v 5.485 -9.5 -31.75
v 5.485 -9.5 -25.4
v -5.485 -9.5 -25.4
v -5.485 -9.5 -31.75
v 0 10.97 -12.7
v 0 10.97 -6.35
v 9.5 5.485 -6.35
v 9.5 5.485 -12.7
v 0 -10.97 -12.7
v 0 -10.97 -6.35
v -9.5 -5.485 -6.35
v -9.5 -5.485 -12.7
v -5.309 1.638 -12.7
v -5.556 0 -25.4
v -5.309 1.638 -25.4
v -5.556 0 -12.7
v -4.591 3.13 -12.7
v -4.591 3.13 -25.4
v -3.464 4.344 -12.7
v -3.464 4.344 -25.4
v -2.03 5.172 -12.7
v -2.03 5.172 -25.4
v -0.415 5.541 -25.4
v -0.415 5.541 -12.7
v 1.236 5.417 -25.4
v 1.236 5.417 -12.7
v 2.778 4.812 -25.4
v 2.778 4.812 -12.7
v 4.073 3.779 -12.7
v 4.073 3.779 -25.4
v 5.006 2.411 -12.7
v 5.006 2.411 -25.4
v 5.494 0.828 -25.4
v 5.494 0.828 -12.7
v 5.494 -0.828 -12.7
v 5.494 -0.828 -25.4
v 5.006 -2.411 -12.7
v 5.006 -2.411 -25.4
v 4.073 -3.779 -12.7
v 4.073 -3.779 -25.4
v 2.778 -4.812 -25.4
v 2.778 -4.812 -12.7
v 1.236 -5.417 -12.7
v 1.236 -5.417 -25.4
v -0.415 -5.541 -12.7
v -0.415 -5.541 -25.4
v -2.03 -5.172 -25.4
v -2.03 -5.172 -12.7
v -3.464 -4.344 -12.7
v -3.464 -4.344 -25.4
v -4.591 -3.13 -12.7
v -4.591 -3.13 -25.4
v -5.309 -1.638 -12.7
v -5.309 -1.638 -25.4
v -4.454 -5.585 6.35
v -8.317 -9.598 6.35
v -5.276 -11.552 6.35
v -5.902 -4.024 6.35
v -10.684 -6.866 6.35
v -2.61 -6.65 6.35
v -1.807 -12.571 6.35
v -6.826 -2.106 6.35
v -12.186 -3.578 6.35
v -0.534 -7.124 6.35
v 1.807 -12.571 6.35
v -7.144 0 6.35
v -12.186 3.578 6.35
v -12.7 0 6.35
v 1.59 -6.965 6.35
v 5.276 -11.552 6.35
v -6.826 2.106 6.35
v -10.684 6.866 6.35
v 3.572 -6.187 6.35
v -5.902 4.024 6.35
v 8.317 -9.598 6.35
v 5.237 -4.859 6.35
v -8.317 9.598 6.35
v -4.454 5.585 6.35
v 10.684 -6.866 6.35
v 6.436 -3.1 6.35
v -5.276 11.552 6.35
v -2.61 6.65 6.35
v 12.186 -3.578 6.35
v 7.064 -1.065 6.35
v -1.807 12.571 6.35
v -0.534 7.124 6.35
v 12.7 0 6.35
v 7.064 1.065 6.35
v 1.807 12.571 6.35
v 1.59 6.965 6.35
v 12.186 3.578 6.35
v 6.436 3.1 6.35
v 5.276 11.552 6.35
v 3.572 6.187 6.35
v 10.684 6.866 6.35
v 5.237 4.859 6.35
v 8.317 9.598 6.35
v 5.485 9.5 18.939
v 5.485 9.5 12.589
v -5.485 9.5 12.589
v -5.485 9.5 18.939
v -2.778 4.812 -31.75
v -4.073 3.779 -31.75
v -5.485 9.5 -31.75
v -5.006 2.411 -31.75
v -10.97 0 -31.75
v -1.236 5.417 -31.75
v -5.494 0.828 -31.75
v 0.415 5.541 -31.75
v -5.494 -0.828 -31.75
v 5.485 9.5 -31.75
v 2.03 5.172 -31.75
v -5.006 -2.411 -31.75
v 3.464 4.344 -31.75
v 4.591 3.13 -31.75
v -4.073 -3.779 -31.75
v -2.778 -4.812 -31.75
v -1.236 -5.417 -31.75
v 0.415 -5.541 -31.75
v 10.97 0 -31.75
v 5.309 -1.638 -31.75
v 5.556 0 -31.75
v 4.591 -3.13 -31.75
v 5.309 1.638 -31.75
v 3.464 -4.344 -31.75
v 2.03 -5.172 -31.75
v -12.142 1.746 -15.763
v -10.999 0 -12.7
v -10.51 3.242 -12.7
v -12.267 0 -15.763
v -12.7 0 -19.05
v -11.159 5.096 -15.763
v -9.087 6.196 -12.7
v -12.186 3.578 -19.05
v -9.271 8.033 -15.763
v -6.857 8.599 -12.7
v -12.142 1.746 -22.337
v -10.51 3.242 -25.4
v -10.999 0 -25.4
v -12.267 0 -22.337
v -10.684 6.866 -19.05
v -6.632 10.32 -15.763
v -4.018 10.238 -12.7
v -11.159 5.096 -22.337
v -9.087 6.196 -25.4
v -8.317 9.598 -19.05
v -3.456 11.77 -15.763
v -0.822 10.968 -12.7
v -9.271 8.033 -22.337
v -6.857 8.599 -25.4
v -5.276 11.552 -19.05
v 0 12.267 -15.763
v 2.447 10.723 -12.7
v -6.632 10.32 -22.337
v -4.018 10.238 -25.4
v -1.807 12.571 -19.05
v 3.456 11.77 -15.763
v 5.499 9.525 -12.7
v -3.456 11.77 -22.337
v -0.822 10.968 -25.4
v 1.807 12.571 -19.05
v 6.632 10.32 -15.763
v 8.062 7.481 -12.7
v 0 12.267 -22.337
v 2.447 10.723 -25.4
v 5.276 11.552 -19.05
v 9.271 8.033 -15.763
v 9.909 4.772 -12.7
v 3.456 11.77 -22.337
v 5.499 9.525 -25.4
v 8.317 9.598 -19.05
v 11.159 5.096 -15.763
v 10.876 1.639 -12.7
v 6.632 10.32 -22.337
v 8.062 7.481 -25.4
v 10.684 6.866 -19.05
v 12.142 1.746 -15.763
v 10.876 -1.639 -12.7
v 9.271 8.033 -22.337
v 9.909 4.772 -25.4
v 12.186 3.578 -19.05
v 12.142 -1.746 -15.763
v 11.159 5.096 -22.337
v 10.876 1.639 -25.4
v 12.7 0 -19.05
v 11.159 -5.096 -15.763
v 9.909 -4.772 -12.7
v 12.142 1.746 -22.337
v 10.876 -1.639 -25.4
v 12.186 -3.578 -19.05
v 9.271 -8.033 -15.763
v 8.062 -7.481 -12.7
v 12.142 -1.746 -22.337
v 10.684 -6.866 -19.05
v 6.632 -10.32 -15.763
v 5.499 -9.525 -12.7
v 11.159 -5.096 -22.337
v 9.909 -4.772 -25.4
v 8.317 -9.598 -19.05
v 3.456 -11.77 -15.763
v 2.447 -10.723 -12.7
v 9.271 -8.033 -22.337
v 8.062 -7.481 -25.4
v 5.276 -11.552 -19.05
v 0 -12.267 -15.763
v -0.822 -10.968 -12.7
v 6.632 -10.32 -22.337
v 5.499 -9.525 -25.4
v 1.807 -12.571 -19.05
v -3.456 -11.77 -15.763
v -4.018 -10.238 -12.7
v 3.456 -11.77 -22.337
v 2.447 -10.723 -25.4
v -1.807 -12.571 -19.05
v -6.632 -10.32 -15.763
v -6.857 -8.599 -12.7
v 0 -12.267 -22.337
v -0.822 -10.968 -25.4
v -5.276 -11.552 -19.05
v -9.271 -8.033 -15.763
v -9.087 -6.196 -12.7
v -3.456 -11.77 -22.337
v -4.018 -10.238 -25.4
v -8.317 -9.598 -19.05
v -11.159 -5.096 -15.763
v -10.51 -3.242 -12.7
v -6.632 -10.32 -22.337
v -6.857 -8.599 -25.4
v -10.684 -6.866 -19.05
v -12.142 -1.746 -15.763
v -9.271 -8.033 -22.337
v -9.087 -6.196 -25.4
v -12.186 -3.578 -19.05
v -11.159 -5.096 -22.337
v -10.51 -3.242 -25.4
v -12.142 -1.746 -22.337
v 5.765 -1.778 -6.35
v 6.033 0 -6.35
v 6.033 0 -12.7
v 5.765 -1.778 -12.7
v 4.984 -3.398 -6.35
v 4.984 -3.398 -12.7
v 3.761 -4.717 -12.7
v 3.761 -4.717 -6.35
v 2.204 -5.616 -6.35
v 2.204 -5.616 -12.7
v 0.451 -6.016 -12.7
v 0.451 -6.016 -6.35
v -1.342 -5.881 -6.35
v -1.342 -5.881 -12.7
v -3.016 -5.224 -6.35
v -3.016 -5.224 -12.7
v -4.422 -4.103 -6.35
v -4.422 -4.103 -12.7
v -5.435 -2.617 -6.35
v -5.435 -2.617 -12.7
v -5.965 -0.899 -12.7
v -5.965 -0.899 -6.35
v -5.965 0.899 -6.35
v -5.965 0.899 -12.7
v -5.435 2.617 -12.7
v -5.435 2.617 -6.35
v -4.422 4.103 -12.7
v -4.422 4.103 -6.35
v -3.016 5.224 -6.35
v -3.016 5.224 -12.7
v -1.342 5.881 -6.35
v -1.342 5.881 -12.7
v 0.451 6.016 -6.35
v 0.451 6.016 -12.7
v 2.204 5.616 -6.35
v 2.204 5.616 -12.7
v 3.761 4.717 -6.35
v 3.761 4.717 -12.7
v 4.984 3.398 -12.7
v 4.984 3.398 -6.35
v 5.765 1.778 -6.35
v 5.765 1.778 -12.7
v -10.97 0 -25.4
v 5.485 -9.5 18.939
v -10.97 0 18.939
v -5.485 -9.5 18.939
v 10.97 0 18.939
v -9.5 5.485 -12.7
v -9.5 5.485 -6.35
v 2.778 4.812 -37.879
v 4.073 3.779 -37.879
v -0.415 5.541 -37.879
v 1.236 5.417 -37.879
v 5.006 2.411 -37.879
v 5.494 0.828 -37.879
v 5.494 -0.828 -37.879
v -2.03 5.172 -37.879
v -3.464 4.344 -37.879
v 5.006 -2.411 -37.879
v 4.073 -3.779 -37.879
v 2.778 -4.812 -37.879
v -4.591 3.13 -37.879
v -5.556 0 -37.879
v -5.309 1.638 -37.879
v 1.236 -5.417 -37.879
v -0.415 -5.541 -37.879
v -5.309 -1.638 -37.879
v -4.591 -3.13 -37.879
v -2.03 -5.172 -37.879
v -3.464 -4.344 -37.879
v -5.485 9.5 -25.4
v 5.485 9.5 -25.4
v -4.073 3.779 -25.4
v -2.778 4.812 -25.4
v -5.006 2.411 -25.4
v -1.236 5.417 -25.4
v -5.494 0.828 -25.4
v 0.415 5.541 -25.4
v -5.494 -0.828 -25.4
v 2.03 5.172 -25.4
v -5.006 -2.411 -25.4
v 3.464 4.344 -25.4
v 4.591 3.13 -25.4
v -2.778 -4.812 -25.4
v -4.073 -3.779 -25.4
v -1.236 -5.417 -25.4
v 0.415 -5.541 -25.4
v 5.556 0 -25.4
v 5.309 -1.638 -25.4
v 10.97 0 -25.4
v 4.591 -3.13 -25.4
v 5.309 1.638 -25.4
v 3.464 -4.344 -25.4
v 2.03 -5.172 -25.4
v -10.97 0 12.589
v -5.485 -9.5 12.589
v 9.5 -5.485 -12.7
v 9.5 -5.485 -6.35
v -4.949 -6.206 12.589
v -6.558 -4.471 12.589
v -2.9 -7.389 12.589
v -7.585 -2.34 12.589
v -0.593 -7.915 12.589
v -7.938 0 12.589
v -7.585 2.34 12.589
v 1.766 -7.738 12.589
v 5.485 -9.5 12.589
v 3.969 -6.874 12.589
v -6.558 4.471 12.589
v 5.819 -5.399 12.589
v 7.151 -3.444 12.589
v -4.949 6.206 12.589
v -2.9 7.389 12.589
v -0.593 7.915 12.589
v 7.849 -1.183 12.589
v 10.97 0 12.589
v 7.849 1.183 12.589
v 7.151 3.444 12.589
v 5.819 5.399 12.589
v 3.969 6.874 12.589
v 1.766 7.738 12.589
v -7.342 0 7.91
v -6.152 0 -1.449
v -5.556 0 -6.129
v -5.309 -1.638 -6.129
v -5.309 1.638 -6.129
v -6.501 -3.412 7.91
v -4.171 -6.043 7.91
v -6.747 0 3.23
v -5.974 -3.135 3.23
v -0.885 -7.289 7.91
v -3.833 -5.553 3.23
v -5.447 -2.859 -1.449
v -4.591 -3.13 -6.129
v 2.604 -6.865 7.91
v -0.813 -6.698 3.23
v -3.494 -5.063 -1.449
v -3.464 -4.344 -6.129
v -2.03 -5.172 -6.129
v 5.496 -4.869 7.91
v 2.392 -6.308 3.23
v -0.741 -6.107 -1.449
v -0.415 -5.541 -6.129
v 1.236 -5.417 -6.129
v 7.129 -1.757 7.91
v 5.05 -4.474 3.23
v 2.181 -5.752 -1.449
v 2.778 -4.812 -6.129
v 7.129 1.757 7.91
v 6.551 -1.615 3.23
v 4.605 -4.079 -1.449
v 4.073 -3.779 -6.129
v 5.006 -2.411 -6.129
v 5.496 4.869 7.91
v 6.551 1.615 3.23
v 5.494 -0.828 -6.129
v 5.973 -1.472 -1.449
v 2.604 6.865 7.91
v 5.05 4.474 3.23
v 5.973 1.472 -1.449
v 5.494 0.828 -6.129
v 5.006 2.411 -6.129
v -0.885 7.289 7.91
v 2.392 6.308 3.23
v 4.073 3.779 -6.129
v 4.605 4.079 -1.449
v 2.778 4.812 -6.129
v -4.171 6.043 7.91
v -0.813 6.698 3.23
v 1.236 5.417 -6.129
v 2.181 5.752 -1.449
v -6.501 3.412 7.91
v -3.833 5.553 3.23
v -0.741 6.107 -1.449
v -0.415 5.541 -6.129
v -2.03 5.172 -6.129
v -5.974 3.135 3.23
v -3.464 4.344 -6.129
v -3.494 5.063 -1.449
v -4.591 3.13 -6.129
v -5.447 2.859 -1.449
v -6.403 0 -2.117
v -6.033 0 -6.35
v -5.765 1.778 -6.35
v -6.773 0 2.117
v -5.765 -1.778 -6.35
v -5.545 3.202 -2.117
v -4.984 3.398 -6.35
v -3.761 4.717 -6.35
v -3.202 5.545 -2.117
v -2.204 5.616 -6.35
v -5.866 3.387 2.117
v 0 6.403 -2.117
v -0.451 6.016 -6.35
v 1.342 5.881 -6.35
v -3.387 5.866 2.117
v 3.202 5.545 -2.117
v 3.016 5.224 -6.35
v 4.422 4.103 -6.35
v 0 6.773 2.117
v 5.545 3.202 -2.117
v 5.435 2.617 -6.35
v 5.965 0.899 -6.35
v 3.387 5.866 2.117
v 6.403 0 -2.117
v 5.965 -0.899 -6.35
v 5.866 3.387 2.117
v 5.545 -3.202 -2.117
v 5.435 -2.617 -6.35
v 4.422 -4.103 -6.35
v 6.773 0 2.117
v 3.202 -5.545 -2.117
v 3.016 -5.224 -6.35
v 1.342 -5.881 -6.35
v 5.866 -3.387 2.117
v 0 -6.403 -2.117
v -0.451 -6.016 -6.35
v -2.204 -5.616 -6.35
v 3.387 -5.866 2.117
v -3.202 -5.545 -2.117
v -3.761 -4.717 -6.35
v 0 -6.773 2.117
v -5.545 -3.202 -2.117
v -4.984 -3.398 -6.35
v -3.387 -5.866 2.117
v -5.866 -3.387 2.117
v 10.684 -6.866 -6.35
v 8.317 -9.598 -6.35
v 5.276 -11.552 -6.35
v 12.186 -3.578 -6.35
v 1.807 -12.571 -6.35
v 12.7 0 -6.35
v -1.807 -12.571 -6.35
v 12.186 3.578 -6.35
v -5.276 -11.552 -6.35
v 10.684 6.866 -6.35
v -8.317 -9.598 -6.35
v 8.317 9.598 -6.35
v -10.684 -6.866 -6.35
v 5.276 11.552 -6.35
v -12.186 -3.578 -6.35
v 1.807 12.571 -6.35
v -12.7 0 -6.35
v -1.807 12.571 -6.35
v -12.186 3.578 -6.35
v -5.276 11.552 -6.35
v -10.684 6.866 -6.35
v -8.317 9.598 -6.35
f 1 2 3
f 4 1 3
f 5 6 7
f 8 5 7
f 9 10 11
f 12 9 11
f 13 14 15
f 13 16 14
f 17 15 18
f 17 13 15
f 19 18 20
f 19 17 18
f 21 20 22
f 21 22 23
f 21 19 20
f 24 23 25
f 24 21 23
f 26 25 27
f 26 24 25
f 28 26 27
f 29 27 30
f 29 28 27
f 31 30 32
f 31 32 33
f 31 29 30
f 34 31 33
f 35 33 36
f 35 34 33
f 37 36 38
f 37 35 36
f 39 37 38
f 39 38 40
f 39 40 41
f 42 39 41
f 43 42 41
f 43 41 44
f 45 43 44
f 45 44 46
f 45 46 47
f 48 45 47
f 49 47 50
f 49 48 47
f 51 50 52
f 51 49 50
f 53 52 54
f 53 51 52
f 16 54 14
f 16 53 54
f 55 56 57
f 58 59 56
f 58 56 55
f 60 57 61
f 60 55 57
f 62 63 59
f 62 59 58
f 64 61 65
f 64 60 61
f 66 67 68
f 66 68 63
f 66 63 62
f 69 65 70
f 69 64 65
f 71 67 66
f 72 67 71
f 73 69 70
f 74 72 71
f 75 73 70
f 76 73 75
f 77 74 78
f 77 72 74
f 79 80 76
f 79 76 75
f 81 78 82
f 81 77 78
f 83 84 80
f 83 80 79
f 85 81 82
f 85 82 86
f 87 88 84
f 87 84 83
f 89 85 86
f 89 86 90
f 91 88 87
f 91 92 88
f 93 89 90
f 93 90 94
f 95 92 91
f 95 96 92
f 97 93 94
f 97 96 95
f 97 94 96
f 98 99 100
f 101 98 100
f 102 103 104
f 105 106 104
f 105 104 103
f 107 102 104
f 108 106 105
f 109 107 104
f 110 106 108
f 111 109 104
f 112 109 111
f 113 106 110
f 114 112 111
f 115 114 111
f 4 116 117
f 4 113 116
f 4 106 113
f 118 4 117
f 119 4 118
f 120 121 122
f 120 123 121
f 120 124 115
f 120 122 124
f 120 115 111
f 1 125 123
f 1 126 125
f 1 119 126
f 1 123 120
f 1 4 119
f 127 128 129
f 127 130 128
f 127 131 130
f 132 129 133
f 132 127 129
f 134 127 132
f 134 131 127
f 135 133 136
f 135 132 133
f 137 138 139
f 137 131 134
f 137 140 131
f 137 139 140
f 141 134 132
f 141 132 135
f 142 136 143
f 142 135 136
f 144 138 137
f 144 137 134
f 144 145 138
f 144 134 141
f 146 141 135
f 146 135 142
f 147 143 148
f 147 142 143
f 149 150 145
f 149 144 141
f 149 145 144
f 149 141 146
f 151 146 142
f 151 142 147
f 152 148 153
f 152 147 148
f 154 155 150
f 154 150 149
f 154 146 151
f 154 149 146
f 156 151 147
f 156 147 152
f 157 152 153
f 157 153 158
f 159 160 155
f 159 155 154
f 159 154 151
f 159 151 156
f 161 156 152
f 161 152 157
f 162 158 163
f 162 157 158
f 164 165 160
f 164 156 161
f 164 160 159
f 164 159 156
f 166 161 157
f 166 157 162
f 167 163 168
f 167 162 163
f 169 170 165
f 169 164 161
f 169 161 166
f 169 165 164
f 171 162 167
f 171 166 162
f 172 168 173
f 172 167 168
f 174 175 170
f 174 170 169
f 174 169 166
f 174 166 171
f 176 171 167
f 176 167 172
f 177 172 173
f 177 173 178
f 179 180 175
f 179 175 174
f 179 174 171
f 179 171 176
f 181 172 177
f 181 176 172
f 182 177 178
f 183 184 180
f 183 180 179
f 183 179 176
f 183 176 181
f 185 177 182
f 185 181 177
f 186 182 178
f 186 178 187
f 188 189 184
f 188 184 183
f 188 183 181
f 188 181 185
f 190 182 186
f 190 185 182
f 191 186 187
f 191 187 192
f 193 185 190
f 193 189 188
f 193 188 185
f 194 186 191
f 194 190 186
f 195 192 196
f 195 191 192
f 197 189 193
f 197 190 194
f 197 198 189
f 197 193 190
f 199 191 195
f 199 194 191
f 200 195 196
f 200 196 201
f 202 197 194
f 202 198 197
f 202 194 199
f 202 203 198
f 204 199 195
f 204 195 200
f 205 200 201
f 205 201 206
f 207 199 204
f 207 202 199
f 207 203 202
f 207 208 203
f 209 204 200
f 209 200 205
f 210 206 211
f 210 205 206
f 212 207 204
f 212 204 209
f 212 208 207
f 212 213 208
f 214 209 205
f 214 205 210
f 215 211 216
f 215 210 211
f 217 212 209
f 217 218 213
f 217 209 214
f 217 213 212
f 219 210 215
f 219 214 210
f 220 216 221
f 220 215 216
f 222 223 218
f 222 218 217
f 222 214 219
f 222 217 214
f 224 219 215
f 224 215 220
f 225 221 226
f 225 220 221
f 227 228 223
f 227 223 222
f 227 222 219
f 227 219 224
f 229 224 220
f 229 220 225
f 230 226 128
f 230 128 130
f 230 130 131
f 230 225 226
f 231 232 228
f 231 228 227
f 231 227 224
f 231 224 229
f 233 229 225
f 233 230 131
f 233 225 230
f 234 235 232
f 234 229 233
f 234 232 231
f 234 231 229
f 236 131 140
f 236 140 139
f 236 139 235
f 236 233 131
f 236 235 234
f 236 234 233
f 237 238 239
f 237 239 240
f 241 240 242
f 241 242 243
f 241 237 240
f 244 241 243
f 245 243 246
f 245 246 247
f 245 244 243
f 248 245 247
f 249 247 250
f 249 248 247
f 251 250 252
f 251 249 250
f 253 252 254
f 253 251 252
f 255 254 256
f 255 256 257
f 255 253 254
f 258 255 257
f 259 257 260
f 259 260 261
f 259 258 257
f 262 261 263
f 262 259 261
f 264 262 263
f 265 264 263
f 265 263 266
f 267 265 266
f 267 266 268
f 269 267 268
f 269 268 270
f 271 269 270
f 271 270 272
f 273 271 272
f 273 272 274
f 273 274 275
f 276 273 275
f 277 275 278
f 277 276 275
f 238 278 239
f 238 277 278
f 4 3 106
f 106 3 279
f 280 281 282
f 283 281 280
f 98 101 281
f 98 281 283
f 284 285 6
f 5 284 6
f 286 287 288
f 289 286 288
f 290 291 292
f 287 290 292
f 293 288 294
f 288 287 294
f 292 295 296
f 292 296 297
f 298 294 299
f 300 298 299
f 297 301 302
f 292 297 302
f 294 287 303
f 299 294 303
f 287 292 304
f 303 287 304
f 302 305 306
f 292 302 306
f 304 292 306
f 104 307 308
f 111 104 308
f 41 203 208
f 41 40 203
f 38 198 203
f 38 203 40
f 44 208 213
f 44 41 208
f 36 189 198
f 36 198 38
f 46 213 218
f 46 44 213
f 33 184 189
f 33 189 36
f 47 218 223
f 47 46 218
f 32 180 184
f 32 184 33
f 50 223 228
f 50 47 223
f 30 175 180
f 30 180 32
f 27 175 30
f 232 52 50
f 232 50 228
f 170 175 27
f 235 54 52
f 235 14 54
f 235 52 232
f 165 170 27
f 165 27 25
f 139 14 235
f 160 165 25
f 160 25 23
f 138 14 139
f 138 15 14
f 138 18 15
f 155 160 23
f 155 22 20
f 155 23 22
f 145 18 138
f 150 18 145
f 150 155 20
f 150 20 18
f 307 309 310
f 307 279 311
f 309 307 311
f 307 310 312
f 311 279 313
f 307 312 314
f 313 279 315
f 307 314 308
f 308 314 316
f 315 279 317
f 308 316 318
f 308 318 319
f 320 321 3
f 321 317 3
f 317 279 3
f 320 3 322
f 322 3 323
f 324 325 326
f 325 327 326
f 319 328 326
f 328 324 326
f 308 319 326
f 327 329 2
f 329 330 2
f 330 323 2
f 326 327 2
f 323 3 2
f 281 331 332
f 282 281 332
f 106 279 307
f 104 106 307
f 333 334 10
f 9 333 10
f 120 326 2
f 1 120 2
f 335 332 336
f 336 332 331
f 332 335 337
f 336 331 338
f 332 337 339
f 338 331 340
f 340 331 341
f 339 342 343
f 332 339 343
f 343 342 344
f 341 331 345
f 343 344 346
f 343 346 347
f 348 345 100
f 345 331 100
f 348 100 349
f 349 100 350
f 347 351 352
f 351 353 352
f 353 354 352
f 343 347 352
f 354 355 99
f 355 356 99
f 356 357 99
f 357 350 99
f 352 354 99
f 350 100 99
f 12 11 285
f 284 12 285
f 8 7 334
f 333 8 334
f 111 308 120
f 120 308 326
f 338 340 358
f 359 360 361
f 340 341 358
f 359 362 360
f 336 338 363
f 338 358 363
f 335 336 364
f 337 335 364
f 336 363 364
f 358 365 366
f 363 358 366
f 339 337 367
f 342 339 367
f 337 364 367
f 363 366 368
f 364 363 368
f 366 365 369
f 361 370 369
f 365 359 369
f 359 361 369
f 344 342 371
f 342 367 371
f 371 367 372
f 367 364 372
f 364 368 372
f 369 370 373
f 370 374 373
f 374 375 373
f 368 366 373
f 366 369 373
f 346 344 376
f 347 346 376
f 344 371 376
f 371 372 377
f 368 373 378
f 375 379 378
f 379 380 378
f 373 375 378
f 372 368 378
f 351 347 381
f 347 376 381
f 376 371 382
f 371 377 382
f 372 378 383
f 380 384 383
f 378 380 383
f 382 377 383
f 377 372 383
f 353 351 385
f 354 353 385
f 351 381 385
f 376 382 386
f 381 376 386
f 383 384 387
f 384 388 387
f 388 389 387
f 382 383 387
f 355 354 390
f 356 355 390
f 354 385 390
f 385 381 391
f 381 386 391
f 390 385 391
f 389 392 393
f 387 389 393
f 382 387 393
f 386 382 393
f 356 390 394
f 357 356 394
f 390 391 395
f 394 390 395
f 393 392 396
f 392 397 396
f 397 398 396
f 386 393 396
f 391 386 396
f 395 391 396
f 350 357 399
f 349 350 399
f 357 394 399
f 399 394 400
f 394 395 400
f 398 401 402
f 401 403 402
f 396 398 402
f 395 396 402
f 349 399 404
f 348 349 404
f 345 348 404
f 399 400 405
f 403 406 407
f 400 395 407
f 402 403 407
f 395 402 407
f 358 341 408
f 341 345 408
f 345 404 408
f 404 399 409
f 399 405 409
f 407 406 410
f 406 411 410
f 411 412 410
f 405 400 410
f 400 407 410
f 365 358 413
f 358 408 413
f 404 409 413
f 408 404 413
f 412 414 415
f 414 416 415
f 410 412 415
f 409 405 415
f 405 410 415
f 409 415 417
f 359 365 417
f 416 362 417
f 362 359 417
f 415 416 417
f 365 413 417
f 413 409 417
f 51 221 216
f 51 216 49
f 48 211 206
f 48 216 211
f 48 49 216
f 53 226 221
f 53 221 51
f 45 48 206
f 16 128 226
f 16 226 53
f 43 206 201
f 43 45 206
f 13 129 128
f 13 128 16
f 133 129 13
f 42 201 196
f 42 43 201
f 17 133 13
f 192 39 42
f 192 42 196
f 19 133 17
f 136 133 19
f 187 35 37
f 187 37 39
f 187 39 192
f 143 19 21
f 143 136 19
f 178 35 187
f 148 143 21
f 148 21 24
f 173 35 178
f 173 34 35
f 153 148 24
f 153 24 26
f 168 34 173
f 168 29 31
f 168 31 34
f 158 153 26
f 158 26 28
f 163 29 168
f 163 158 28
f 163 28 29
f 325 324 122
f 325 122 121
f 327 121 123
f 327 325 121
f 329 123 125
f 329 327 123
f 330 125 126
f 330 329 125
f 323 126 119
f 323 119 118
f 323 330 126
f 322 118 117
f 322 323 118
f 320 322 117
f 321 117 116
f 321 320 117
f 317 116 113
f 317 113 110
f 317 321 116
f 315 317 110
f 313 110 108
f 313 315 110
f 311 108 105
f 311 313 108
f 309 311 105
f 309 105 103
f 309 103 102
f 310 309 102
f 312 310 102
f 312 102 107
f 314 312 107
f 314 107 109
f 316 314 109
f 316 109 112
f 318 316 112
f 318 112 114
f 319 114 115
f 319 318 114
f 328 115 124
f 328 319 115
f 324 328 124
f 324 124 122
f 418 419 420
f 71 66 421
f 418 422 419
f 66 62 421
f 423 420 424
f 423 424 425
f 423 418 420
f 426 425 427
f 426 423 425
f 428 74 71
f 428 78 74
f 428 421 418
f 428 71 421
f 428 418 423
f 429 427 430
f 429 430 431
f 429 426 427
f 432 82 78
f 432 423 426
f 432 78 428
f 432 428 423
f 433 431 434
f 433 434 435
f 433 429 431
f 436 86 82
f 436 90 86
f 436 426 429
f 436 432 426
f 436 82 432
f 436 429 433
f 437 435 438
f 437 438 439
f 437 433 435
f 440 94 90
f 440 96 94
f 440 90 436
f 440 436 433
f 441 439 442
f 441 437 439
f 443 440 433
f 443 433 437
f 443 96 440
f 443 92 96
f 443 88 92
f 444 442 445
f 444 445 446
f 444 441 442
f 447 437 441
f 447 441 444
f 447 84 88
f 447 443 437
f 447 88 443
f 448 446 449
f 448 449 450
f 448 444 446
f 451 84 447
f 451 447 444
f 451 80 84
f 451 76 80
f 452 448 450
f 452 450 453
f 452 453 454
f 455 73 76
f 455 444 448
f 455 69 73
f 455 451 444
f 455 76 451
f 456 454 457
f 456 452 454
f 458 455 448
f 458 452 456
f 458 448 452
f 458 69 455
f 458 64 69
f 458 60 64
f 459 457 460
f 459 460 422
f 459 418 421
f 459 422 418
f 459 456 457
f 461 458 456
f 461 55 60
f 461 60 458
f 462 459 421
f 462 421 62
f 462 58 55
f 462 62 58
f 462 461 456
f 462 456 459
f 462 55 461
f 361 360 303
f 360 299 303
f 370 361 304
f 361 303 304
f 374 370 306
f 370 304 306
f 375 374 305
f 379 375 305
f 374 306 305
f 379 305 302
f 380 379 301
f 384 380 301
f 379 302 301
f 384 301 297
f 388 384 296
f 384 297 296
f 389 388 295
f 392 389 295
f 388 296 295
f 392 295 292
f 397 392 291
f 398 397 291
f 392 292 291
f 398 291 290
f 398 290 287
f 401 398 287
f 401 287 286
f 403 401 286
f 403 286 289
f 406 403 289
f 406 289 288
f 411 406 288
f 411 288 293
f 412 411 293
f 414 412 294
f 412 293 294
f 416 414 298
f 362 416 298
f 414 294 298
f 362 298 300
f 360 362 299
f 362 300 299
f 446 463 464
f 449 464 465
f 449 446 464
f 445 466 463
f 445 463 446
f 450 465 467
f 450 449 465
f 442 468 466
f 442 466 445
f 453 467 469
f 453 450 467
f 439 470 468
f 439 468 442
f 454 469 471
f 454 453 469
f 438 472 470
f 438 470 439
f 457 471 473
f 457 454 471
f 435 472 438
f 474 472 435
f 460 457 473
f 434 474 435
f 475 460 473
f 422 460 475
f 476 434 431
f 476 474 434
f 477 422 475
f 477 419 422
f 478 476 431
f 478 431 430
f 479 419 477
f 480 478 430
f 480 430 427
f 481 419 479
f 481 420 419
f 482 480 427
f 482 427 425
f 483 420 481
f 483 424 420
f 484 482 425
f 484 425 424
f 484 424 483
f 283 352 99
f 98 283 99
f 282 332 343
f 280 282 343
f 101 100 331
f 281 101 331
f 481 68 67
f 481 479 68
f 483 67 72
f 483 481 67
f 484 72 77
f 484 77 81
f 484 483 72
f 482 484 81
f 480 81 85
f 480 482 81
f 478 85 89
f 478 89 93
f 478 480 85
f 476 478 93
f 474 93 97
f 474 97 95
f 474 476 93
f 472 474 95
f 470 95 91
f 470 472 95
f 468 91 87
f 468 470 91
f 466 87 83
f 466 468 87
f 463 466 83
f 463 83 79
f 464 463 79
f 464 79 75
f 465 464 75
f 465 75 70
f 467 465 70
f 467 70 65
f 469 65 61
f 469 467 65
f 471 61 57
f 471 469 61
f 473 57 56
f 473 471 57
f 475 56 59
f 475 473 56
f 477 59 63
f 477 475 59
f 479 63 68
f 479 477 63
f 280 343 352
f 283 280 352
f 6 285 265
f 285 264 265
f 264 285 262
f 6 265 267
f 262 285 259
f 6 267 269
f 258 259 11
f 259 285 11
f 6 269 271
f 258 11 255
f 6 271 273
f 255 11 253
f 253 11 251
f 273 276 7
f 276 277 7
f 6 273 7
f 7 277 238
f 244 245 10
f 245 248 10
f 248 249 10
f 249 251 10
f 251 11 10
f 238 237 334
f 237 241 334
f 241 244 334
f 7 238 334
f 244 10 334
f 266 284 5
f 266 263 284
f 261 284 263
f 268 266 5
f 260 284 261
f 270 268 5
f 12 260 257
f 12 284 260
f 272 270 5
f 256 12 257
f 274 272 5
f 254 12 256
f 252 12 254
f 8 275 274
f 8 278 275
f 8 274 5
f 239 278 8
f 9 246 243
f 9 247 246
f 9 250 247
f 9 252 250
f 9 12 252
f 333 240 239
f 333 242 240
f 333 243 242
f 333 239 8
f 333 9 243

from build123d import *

# Parameters (mm, degrees)
F4_R      = 7.9375
F5_DEPTH  = 6.35
F8_R      = 6.0326439732
F9_DEPTH  = 6.35
F10_R     = 5.55625
F11_DEPTH = 6.35


with BuildPart() as f1:
    # F0 (on Front) → F1 (revolve)
    with BuildSketch(Plane.XZ):
        Polygon((-6.0326439732, -6.35), (-7.14375, 6.35), (-12.7, 6.35), (-12.7, -6.35), align=None)
    revolve(axis=Axis((0, 0, 0.0013147309), (0, 0, -1)))


with BuildPart() as f3:
    # F2 (on Front) → F3 (revolve)
    with BuildSketch(Plane.XZ):
        Polygon((0, 12.5893847921), (-7.9375, 12.5893847921), (-5.55625, -6.1287695843), (-5.55625, -37.8787695843), (0, -37.8787695843), align=None)
    revolve(axis=Axis((0, 0, -12.6446923961), (0, 0, 1)))

    # F4 (on face) → F5 (join)
    with BuildSketch(Plane.XY.offset(12.5893847921)):
        Polygon((10.9696551146, 0), (5.4848275573, 9.5), (-5.4848275573, 9.5), (-10.9696551146, 0), (-5.4848275573, -9.5), (5.4848275573, -9.5), align=None)
        Circle(F4_R, mode=Mode.SUBTRACT)
        Circle(F4_R)
    extrude(amount=F5_DEPTH)


with BuildPart() as f7:
    # F6 (on Front) → F7 (revolve)
    with BuildSketch(Plane.XZ):
        with BuildLine():
            Line((-5.55625, -25.4), (-5.55625, -12.7))
            Line((-5.55625, -12.7), (-10.9985226281, -12.7))
            ThreePointArc((-10.9985226281, -12.7), (-12.7, -19.05), (-10.9985226281, -25.4))
            Line((-10.9985226281, -25.4), (-5.55625, -25.4))
        make_face()
    revolve(axis=Axis((0, 0, 0.0013147309), (0, 0, -1)))


with BuildPart() as f9:
    # F8 (on face) → F9 (new body)
    with BuildSketch(Plane(origin=(0, 0, -6.35), x_dir=(1, 0, 0), z_dir=(0, 0, -1))):
        Polygon((9.5, 5.4848275573), (0, 10.9696551146), (-9.5, 5.4848275573), (-9.5, -5.4848275573), (0, -10.9696551146), (9.5, -5.4848275573), align=None)
        Circle(F8_R, mode=Mode.SUBTRACT)
    extrude(amount=F9_DEPTH)


with BuildPart() as f11:
    # F10 (on face) → F11 (new body)
    with BuildSketch(Plane(origin=(0, 0, -25.4), x_dir=(1, 0, 0), z_dir=(0, 0, -1))):
        Polygon((5.4848275573, 9.5), (-5.4848275573, 9.5), (-10.9696551146, 0), (-5.4848275573, -9.5), (5.4848275573, -9.5), (10.9696551146, 0), align=None)
        Circle(F10_R, mode=Mode.SUBTRACT)
    extrude(amount=F11_DEPTH)


solid = Compound([f1.part, f3.part, f7.part, f9.part, f11.part])
